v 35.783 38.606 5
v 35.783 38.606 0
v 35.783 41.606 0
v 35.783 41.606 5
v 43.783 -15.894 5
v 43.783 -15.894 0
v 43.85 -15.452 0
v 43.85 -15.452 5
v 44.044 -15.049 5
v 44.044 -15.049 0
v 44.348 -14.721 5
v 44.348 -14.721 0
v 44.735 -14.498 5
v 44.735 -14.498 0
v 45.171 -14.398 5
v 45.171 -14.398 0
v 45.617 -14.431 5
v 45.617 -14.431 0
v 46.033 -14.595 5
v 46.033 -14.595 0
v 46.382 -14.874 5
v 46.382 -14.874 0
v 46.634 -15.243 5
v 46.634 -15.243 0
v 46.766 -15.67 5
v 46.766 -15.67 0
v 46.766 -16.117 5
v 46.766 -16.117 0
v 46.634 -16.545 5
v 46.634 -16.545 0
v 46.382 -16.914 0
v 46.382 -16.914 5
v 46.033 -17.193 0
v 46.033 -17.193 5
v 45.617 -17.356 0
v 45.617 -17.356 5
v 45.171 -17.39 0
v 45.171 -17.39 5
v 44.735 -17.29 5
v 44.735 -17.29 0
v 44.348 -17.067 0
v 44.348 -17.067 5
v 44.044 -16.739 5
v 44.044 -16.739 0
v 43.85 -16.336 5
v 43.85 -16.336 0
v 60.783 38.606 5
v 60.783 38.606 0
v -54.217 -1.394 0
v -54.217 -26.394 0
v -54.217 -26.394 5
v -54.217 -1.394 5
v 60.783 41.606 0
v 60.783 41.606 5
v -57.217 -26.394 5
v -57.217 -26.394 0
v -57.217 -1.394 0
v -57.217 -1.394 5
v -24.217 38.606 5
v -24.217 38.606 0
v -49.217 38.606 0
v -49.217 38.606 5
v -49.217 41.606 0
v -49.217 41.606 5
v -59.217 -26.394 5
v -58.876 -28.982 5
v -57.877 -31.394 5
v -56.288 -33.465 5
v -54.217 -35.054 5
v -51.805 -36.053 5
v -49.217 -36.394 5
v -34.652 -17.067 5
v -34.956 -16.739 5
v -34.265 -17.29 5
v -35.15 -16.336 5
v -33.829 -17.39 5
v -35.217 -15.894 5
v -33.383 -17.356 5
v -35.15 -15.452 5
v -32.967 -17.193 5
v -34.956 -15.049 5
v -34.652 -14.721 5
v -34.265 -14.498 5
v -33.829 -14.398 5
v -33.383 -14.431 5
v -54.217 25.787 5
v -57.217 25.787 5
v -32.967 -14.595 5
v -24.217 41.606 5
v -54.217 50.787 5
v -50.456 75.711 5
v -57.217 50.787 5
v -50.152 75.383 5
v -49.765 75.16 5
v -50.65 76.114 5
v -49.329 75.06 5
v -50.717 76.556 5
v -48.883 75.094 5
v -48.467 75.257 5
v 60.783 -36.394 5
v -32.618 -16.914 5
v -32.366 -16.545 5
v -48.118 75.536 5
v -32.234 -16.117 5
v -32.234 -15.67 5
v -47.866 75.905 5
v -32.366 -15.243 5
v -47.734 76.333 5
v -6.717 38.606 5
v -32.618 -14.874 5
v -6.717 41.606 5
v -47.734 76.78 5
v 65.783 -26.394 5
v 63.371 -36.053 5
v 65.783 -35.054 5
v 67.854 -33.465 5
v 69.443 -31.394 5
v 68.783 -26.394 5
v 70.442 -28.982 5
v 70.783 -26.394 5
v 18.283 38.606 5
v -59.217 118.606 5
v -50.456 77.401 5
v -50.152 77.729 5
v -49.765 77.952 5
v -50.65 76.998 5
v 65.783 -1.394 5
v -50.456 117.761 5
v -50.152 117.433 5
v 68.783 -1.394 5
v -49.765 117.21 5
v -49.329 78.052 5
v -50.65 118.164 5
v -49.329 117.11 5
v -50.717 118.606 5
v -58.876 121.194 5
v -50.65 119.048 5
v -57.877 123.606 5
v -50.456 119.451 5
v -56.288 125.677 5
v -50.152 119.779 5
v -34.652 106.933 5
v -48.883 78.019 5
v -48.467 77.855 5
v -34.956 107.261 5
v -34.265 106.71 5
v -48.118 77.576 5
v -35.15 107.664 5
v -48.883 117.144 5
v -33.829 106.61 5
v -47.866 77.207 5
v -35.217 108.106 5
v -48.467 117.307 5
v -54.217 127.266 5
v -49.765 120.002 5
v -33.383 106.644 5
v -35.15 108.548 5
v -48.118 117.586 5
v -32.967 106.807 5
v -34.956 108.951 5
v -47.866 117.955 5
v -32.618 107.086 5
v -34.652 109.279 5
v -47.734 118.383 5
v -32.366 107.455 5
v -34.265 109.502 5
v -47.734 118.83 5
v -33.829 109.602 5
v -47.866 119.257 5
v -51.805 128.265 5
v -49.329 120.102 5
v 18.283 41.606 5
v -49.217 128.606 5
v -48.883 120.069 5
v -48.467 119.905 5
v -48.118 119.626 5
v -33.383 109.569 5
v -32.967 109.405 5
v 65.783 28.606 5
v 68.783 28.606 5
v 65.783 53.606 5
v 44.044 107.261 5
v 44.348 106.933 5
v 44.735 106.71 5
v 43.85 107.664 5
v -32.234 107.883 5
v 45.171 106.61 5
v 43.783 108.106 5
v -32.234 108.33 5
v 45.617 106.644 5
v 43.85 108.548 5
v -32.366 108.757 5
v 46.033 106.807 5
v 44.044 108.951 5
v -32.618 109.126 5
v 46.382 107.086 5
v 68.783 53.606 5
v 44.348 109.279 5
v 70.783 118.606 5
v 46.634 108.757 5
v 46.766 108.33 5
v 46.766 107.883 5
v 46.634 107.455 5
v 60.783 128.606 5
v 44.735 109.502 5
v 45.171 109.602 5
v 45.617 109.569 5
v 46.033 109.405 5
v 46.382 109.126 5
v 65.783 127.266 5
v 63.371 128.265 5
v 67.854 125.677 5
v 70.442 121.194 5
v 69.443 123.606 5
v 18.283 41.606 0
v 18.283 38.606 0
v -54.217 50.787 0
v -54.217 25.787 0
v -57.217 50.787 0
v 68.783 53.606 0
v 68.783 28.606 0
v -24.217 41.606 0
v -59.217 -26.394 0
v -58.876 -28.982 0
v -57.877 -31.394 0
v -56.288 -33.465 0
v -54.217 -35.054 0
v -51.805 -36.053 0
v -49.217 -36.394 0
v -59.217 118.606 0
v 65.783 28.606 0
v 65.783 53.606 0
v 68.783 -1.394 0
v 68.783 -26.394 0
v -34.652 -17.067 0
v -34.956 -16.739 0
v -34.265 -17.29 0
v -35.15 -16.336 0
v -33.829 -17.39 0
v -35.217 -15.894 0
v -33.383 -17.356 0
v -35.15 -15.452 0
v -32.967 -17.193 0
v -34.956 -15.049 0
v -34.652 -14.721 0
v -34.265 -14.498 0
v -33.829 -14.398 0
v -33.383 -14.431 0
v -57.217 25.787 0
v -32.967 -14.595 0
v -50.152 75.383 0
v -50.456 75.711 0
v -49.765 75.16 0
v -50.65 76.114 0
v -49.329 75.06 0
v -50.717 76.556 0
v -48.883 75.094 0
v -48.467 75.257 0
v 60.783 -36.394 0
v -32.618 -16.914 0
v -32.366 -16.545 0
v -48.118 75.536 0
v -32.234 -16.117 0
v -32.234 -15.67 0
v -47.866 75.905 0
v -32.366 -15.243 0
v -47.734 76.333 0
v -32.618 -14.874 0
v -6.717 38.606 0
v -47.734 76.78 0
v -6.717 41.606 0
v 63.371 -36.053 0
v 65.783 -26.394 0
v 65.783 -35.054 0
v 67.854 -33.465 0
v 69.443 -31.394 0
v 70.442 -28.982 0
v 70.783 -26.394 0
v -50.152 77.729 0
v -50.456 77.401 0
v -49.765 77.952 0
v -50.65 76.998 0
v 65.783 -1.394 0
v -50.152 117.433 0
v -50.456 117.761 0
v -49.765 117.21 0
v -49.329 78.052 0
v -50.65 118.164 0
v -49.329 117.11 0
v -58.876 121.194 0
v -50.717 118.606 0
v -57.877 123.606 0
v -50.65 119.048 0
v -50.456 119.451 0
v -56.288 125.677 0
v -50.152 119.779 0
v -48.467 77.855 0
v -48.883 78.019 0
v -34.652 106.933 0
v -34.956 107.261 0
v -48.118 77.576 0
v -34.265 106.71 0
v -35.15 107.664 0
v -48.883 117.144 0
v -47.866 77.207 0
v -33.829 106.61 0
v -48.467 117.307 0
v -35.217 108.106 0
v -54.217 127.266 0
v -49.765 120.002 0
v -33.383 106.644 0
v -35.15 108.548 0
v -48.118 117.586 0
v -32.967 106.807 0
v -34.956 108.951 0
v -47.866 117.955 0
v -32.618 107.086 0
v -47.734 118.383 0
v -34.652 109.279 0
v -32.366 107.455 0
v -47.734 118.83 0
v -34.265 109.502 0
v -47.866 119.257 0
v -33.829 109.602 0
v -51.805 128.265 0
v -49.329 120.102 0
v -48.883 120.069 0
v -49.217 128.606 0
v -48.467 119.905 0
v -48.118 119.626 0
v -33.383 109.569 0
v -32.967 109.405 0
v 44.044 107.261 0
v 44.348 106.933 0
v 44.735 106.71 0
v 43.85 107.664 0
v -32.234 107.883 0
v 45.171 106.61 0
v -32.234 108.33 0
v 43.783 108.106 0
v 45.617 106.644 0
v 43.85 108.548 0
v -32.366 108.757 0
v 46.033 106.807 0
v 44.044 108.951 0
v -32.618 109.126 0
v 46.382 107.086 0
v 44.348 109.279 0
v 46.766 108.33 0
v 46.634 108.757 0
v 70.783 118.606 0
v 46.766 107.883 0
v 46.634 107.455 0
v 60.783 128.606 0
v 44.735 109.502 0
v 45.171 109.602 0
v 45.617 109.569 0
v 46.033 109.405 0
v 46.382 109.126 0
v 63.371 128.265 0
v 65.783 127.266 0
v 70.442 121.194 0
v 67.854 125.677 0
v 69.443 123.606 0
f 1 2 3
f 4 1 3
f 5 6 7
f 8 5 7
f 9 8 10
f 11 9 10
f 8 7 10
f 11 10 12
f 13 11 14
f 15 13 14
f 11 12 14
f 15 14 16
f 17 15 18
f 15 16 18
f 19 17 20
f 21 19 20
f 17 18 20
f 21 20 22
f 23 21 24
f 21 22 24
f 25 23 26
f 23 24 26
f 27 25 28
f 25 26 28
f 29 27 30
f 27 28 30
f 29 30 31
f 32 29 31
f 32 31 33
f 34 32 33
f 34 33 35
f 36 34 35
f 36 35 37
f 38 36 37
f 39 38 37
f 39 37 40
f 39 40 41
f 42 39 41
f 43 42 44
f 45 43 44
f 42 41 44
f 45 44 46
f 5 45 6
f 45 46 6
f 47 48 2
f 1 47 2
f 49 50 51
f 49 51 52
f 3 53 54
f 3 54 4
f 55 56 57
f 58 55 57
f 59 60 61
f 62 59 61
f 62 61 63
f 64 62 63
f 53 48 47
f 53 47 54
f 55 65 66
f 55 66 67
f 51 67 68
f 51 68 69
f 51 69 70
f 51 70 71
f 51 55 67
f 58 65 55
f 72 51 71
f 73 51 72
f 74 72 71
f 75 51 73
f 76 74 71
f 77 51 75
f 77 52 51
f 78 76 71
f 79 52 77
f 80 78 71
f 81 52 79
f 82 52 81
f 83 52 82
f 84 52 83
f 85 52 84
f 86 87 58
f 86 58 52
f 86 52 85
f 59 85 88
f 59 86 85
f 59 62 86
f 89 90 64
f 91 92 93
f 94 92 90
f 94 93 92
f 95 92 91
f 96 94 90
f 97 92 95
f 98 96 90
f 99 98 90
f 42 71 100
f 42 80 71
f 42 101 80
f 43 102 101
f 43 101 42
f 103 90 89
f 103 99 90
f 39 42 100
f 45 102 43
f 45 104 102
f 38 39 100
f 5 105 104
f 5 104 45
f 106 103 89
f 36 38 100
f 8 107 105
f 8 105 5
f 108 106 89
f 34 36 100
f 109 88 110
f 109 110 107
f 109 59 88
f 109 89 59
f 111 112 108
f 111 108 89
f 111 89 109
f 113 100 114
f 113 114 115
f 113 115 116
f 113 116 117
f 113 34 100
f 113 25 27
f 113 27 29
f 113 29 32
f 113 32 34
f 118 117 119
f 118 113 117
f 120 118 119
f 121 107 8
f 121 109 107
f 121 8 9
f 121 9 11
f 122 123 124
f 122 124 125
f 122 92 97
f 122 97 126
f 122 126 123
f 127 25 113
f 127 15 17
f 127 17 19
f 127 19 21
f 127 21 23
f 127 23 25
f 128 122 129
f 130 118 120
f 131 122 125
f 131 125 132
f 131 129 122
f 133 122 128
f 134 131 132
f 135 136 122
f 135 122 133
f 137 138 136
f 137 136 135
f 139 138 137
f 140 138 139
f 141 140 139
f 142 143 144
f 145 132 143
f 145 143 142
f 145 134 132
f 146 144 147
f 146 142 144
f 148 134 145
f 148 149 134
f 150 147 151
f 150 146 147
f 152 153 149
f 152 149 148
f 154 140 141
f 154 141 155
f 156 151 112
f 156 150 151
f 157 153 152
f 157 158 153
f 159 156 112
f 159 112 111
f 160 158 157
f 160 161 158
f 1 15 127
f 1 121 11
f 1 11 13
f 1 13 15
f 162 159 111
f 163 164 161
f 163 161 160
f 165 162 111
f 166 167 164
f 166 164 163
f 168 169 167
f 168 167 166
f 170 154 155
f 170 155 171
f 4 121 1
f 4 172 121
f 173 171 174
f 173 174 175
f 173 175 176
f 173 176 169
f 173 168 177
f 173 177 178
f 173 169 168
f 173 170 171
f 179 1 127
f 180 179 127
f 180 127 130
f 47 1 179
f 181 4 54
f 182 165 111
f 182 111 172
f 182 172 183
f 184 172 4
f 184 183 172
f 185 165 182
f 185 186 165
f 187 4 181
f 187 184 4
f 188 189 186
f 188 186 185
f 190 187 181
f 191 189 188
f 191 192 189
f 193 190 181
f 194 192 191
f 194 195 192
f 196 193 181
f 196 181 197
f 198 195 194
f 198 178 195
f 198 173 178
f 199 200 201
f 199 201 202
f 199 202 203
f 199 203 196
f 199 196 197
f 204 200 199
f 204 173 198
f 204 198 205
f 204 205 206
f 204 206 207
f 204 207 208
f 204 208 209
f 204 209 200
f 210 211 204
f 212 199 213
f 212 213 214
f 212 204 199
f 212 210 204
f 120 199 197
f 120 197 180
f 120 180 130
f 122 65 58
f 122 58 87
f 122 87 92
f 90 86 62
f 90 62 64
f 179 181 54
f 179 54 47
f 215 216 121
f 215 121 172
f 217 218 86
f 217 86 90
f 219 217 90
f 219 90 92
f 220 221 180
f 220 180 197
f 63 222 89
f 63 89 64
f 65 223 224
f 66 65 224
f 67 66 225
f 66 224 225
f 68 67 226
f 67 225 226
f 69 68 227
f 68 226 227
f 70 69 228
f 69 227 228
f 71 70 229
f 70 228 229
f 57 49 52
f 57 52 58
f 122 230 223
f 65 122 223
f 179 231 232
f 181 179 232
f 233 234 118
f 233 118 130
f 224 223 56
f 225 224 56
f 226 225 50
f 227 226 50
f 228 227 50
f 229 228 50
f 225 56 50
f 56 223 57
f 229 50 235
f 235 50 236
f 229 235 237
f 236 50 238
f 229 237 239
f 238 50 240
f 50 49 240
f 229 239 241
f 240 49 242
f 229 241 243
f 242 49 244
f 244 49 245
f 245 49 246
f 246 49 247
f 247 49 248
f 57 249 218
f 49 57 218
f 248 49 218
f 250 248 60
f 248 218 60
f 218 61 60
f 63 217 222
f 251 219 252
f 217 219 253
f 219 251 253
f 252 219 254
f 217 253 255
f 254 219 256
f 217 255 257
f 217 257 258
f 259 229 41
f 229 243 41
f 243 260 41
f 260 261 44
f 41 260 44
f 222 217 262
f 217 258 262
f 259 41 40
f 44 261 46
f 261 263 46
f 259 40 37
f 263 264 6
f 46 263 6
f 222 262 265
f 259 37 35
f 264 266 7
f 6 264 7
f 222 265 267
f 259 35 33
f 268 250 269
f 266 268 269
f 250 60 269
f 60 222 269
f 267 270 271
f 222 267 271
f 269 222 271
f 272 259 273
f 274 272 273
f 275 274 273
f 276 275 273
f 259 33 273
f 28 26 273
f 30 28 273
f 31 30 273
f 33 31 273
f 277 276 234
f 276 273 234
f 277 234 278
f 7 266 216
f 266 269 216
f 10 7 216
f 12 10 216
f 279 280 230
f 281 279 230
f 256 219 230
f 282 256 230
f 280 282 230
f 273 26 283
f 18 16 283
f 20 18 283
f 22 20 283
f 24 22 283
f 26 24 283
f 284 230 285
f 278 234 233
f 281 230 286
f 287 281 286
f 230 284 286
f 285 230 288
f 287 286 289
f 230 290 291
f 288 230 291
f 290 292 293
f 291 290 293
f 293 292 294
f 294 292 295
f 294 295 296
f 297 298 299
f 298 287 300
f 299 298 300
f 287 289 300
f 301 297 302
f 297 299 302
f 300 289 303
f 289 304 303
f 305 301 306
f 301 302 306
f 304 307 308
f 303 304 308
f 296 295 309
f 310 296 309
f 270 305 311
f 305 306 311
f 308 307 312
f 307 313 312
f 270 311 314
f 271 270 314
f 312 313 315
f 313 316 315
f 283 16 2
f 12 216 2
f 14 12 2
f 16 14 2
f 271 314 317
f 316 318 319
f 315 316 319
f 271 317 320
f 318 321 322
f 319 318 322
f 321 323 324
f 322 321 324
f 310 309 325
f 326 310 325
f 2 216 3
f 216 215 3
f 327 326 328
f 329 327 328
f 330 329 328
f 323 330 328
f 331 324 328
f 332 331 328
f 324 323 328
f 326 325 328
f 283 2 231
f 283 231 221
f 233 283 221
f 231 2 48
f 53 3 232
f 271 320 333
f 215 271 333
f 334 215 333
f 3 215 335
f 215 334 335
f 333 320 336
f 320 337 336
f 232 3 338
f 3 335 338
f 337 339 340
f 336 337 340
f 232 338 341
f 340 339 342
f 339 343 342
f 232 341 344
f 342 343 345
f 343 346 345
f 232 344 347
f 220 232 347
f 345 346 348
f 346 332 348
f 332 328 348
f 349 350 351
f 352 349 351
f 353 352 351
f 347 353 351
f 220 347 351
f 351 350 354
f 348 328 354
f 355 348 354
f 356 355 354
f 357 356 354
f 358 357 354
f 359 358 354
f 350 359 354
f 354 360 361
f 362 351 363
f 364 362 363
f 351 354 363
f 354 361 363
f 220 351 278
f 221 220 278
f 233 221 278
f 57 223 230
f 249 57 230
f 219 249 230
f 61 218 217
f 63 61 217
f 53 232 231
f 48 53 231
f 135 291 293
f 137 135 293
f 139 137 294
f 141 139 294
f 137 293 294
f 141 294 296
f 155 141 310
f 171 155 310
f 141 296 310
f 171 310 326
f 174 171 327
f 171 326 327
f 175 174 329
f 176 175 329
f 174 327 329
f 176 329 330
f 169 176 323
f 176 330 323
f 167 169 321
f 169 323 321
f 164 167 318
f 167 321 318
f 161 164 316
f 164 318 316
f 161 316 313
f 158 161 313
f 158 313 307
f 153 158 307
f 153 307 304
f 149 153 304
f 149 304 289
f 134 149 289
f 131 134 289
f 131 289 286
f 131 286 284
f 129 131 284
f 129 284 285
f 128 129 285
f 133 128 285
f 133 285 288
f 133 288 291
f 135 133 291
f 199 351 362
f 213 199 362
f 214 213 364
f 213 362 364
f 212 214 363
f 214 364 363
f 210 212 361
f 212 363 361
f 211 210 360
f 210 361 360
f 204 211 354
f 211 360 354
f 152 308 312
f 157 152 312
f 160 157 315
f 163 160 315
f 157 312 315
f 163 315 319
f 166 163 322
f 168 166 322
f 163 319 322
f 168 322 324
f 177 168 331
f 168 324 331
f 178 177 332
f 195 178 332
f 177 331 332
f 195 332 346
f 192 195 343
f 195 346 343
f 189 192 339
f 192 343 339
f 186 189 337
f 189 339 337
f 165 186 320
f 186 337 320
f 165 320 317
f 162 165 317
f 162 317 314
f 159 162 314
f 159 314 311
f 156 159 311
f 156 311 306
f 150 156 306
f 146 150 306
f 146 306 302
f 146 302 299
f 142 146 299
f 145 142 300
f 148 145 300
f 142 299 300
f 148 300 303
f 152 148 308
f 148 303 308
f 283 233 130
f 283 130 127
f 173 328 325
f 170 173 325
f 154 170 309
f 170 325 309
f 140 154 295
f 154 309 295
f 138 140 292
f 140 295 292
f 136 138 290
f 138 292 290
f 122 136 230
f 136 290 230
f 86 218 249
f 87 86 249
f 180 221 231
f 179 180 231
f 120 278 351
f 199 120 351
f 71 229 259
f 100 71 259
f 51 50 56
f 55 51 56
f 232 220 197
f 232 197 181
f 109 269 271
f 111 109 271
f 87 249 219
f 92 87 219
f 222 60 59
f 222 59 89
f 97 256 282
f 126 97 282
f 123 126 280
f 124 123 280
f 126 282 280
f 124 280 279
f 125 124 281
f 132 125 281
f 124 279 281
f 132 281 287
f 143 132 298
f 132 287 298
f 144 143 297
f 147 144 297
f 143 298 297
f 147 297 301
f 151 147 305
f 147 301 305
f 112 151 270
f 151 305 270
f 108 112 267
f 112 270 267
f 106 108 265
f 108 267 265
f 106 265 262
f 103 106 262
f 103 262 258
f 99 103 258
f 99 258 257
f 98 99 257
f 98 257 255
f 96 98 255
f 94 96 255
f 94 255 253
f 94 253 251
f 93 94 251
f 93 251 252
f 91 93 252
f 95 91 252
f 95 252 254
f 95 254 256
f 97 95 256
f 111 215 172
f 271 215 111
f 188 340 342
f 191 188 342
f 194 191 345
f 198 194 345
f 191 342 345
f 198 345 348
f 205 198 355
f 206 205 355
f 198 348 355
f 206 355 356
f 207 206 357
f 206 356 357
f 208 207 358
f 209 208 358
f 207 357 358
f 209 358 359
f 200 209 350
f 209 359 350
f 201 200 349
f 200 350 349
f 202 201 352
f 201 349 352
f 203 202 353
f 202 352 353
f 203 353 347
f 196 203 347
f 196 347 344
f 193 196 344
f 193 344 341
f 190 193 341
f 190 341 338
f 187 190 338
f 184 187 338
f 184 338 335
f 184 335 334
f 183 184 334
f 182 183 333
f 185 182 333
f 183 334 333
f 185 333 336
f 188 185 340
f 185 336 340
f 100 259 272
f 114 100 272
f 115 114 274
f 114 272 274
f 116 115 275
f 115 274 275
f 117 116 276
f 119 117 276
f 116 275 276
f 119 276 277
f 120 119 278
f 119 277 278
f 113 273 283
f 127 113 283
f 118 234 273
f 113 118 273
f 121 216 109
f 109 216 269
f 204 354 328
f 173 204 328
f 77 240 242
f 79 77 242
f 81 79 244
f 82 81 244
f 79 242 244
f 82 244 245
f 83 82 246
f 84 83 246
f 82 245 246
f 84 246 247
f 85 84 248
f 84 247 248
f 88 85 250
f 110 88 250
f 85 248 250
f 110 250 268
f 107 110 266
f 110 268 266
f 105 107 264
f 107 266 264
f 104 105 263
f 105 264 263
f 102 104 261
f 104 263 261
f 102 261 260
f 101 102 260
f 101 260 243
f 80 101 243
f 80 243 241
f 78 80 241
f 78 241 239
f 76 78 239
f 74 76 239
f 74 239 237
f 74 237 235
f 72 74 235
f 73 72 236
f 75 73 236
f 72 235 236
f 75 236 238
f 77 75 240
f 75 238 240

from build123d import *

# Parameters (mm, degrees)
RESSALTO_EXTRUS_O1_DEPTH = 5
ESBO_O2_R                = 1.5
CORTE_EXTRUS_O1_DEPTH    = 5
ESBO_O3_R                = 1.5
CORTE_EXTRUS_O2_DEPTH    = 6
ESBO_O6_W                = 3
ESBO_O6_H                = 25
ESBO_O6_W_2              = 25
ESBO_O6_H_2              = 3
CORTE_EXTRUS_O4_DEPTH    = 6


with BuildPart() as part:
    # Esboço1 → Ressalto-extrusão1 (new body)
    with BuildSketch(Plane.XY):
        with BuildLine():
            Line((-49.217119449, -36.393854661), (60.782880551, -36.393854661))
            ThreePointArc((60.782880551, -36.393854661), (67.853948363, -33.464922473), (70.782880551, -26.393854661))
            Line((70.782880551, -26.393854661), (70.782880551, 118.606145339))
            ThreePointArc((70.782880551, 118.606145339), (67.853948363, 125.67721315), (60.782880551, 128.606145339))
            Line((60.782880551, 128.606145339), (-49.217119449, 128.606145339))
            ThreePointArc((-49.217119449, 128.606145339), (-56.288187261, 125.67721315), (-59.217119449, 118.606145339))
            Line((-59.217119449, 118.606145339), (-59.217119449, -26.393854661))
            ThreePointArc((-59.217119449, -26.393854661), (-56.288187261, -33.464922473), (-49.217119449, -36.393854661))
        make_face()
    extrude(amount=RESSALTO_EXTRUS_O1_DEPTH)

    # Esboço2 → Corte-extrusão1 (cut)
    with BuildSketch(Plane(origin=(0, 0, 0), x_dir=(-1, 0, 0), z_dir=(0, 0, -1))):
        with Locations((33.717119449, -15.893854661)):
            Circle(ESBO_O2_R)
        with Locations((33.717119449, 108.106145339)):
            Circle(ESBO_O2_R)
        with Locations((-45.282880551, -15.893854661)):
            Circle(ESBO_O2_R)
        with Locations((-45.282880551, 108.106145339)):
            Circle(ESBO_O2_R)
    extrude(amount=-CORTE_EXTRUS_O1_DEPTH, mode=Mode.SUBTRACT)

    # Esboço3 → Corte-extrusão2 (cut, through all)
    with BuildSketch(Plane(origin=(0, 0, 0), x_dir=(-1, 0, 0), z_dir=(0, 0, -1))):
        with Locations((49.217119449, 118.606145339)):
            Circle(ESBO_O3_R)
        with Locations((49.217119449, 76.556145339)):
            Circle(ESBO_O3_R)
    extrude(amount=-CORTE_EXTRUS_O2_DEPTH, mode=Mode.SUBTRACT)

    # Esboço6 → Corte-extrusão4 (cut, through all)
    with BuildSketch(Plane(origin=(0, 0, 0), x_dir=(-1, 0, 0), z_dir=(0, 0, -1))):
        with Locations((-67.282880551, -13.893854661)):
            Rectangle(ESBO_O6_W, ESBO_O6_H)
        with Locations((-67.282880551, 41.106145339)):
            Rectangle(ESBO_O6_W, ESBO_O6_H)
        with Locations((-48.282880551, 40.106145339)):
            Rectangle(ESBO_O6_W_2, ESBO_O6_H_2)
        with Locations((36.717119449, 40.106145339)):
            Rectangle(ESBO_O6_W_2, ESBO_O6_H_2)
        with Locations((55.717119449, 38.28693606)):
            Rectangle(ESBO_O6_W, ESBO_O6_H)
        with Locations((55.717119449, -13.893854661)):
            Rectangle(ESBO_O6_W, ESBO_O6_H)
        with Locations((-5.782880551, 40.106145339)):
            Rectangle(ESBO_O6_W_2, ESBO_O6_H_2)
    extrude(amount=-CORTE_EXTRUS_O4_DEPTH, mode=Mode.SUBTRACT)


solid = part.part
